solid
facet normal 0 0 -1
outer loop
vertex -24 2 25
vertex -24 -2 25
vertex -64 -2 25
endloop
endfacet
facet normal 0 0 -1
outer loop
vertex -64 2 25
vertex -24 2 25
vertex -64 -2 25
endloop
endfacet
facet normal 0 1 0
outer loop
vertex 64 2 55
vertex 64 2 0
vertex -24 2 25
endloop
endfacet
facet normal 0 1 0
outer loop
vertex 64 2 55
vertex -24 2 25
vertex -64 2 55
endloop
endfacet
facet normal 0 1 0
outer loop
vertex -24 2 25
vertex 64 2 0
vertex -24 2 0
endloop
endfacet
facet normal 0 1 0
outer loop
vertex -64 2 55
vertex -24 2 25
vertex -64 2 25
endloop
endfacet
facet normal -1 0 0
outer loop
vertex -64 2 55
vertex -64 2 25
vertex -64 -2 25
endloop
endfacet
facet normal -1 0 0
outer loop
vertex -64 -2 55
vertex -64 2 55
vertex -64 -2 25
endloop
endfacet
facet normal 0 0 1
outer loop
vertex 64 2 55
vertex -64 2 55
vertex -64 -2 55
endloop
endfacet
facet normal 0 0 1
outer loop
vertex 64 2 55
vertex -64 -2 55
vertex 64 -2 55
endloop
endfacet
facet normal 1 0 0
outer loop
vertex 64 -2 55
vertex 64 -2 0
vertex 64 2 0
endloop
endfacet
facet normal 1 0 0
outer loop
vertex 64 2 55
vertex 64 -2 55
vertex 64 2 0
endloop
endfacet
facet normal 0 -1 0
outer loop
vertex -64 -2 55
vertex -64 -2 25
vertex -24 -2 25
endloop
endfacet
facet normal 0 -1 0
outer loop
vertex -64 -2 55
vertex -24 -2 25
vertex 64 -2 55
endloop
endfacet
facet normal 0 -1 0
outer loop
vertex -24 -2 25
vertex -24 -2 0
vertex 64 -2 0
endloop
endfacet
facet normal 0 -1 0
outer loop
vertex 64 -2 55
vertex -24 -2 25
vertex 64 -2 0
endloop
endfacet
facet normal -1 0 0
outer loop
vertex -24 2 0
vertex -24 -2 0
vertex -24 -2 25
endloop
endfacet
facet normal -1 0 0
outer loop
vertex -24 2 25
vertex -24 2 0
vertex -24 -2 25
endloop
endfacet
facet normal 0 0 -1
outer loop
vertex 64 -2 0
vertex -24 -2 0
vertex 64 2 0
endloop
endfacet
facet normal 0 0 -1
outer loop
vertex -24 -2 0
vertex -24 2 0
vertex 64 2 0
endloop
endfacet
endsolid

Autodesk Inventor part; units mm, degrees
ref_plane "YZ Plane" through (0, 0, 0) normal (1, 0, 0) x (0, 1, 0)
ref_plane "XZ Plane" through (0, 0, 0) normal (0, 1, 0) x (-1, 0, 0)
ref_plane "XY Plane" through (0, 0, 0) normal (0, 0, 1) x (1, 0, 0)
sketch "Sketch2" plane through (0, 0, 0) normal (0, 0, 1) x (1, 0, 0)
  line L0 (-64, -2) -> (64, -2)
  line L1 (64, -2) -> (64, 2)
  line L2 (64, 2) -> (-64, 2)
  line L3 (-64, 2) -> (-64, -2)
  line L4 (-64, -2) -> (64, 2) construction
  line L5 (64, -2) -> (-64, 2) construction
  point P0 (0, 0)
  dimension "d0" = 4
  dimension "d1" = 128
extrude "Extrusion1" add sketch "Sketch2" along normal blind 55
sketch "Sketch3" plane through (-64, -2, 0) normal (0, -1, 0) x (1, 0, 0)
  line L0 (0, 0) -> (128, 0) projected
  line L1 (0, 0) -> (40, 0)
  line L2 (40, 0) -> (40, 25)
  line L3 (40, 25) -> (0, 25)
  line L4 (0, 25) -> (0, 0)
  point P0 (64, 0)
  dimension "d4" = 40
  dimension "d5" = 25
extrude "Extrusion2" cut sketch "Sketch3" against normal through all
properties part number "divider"
